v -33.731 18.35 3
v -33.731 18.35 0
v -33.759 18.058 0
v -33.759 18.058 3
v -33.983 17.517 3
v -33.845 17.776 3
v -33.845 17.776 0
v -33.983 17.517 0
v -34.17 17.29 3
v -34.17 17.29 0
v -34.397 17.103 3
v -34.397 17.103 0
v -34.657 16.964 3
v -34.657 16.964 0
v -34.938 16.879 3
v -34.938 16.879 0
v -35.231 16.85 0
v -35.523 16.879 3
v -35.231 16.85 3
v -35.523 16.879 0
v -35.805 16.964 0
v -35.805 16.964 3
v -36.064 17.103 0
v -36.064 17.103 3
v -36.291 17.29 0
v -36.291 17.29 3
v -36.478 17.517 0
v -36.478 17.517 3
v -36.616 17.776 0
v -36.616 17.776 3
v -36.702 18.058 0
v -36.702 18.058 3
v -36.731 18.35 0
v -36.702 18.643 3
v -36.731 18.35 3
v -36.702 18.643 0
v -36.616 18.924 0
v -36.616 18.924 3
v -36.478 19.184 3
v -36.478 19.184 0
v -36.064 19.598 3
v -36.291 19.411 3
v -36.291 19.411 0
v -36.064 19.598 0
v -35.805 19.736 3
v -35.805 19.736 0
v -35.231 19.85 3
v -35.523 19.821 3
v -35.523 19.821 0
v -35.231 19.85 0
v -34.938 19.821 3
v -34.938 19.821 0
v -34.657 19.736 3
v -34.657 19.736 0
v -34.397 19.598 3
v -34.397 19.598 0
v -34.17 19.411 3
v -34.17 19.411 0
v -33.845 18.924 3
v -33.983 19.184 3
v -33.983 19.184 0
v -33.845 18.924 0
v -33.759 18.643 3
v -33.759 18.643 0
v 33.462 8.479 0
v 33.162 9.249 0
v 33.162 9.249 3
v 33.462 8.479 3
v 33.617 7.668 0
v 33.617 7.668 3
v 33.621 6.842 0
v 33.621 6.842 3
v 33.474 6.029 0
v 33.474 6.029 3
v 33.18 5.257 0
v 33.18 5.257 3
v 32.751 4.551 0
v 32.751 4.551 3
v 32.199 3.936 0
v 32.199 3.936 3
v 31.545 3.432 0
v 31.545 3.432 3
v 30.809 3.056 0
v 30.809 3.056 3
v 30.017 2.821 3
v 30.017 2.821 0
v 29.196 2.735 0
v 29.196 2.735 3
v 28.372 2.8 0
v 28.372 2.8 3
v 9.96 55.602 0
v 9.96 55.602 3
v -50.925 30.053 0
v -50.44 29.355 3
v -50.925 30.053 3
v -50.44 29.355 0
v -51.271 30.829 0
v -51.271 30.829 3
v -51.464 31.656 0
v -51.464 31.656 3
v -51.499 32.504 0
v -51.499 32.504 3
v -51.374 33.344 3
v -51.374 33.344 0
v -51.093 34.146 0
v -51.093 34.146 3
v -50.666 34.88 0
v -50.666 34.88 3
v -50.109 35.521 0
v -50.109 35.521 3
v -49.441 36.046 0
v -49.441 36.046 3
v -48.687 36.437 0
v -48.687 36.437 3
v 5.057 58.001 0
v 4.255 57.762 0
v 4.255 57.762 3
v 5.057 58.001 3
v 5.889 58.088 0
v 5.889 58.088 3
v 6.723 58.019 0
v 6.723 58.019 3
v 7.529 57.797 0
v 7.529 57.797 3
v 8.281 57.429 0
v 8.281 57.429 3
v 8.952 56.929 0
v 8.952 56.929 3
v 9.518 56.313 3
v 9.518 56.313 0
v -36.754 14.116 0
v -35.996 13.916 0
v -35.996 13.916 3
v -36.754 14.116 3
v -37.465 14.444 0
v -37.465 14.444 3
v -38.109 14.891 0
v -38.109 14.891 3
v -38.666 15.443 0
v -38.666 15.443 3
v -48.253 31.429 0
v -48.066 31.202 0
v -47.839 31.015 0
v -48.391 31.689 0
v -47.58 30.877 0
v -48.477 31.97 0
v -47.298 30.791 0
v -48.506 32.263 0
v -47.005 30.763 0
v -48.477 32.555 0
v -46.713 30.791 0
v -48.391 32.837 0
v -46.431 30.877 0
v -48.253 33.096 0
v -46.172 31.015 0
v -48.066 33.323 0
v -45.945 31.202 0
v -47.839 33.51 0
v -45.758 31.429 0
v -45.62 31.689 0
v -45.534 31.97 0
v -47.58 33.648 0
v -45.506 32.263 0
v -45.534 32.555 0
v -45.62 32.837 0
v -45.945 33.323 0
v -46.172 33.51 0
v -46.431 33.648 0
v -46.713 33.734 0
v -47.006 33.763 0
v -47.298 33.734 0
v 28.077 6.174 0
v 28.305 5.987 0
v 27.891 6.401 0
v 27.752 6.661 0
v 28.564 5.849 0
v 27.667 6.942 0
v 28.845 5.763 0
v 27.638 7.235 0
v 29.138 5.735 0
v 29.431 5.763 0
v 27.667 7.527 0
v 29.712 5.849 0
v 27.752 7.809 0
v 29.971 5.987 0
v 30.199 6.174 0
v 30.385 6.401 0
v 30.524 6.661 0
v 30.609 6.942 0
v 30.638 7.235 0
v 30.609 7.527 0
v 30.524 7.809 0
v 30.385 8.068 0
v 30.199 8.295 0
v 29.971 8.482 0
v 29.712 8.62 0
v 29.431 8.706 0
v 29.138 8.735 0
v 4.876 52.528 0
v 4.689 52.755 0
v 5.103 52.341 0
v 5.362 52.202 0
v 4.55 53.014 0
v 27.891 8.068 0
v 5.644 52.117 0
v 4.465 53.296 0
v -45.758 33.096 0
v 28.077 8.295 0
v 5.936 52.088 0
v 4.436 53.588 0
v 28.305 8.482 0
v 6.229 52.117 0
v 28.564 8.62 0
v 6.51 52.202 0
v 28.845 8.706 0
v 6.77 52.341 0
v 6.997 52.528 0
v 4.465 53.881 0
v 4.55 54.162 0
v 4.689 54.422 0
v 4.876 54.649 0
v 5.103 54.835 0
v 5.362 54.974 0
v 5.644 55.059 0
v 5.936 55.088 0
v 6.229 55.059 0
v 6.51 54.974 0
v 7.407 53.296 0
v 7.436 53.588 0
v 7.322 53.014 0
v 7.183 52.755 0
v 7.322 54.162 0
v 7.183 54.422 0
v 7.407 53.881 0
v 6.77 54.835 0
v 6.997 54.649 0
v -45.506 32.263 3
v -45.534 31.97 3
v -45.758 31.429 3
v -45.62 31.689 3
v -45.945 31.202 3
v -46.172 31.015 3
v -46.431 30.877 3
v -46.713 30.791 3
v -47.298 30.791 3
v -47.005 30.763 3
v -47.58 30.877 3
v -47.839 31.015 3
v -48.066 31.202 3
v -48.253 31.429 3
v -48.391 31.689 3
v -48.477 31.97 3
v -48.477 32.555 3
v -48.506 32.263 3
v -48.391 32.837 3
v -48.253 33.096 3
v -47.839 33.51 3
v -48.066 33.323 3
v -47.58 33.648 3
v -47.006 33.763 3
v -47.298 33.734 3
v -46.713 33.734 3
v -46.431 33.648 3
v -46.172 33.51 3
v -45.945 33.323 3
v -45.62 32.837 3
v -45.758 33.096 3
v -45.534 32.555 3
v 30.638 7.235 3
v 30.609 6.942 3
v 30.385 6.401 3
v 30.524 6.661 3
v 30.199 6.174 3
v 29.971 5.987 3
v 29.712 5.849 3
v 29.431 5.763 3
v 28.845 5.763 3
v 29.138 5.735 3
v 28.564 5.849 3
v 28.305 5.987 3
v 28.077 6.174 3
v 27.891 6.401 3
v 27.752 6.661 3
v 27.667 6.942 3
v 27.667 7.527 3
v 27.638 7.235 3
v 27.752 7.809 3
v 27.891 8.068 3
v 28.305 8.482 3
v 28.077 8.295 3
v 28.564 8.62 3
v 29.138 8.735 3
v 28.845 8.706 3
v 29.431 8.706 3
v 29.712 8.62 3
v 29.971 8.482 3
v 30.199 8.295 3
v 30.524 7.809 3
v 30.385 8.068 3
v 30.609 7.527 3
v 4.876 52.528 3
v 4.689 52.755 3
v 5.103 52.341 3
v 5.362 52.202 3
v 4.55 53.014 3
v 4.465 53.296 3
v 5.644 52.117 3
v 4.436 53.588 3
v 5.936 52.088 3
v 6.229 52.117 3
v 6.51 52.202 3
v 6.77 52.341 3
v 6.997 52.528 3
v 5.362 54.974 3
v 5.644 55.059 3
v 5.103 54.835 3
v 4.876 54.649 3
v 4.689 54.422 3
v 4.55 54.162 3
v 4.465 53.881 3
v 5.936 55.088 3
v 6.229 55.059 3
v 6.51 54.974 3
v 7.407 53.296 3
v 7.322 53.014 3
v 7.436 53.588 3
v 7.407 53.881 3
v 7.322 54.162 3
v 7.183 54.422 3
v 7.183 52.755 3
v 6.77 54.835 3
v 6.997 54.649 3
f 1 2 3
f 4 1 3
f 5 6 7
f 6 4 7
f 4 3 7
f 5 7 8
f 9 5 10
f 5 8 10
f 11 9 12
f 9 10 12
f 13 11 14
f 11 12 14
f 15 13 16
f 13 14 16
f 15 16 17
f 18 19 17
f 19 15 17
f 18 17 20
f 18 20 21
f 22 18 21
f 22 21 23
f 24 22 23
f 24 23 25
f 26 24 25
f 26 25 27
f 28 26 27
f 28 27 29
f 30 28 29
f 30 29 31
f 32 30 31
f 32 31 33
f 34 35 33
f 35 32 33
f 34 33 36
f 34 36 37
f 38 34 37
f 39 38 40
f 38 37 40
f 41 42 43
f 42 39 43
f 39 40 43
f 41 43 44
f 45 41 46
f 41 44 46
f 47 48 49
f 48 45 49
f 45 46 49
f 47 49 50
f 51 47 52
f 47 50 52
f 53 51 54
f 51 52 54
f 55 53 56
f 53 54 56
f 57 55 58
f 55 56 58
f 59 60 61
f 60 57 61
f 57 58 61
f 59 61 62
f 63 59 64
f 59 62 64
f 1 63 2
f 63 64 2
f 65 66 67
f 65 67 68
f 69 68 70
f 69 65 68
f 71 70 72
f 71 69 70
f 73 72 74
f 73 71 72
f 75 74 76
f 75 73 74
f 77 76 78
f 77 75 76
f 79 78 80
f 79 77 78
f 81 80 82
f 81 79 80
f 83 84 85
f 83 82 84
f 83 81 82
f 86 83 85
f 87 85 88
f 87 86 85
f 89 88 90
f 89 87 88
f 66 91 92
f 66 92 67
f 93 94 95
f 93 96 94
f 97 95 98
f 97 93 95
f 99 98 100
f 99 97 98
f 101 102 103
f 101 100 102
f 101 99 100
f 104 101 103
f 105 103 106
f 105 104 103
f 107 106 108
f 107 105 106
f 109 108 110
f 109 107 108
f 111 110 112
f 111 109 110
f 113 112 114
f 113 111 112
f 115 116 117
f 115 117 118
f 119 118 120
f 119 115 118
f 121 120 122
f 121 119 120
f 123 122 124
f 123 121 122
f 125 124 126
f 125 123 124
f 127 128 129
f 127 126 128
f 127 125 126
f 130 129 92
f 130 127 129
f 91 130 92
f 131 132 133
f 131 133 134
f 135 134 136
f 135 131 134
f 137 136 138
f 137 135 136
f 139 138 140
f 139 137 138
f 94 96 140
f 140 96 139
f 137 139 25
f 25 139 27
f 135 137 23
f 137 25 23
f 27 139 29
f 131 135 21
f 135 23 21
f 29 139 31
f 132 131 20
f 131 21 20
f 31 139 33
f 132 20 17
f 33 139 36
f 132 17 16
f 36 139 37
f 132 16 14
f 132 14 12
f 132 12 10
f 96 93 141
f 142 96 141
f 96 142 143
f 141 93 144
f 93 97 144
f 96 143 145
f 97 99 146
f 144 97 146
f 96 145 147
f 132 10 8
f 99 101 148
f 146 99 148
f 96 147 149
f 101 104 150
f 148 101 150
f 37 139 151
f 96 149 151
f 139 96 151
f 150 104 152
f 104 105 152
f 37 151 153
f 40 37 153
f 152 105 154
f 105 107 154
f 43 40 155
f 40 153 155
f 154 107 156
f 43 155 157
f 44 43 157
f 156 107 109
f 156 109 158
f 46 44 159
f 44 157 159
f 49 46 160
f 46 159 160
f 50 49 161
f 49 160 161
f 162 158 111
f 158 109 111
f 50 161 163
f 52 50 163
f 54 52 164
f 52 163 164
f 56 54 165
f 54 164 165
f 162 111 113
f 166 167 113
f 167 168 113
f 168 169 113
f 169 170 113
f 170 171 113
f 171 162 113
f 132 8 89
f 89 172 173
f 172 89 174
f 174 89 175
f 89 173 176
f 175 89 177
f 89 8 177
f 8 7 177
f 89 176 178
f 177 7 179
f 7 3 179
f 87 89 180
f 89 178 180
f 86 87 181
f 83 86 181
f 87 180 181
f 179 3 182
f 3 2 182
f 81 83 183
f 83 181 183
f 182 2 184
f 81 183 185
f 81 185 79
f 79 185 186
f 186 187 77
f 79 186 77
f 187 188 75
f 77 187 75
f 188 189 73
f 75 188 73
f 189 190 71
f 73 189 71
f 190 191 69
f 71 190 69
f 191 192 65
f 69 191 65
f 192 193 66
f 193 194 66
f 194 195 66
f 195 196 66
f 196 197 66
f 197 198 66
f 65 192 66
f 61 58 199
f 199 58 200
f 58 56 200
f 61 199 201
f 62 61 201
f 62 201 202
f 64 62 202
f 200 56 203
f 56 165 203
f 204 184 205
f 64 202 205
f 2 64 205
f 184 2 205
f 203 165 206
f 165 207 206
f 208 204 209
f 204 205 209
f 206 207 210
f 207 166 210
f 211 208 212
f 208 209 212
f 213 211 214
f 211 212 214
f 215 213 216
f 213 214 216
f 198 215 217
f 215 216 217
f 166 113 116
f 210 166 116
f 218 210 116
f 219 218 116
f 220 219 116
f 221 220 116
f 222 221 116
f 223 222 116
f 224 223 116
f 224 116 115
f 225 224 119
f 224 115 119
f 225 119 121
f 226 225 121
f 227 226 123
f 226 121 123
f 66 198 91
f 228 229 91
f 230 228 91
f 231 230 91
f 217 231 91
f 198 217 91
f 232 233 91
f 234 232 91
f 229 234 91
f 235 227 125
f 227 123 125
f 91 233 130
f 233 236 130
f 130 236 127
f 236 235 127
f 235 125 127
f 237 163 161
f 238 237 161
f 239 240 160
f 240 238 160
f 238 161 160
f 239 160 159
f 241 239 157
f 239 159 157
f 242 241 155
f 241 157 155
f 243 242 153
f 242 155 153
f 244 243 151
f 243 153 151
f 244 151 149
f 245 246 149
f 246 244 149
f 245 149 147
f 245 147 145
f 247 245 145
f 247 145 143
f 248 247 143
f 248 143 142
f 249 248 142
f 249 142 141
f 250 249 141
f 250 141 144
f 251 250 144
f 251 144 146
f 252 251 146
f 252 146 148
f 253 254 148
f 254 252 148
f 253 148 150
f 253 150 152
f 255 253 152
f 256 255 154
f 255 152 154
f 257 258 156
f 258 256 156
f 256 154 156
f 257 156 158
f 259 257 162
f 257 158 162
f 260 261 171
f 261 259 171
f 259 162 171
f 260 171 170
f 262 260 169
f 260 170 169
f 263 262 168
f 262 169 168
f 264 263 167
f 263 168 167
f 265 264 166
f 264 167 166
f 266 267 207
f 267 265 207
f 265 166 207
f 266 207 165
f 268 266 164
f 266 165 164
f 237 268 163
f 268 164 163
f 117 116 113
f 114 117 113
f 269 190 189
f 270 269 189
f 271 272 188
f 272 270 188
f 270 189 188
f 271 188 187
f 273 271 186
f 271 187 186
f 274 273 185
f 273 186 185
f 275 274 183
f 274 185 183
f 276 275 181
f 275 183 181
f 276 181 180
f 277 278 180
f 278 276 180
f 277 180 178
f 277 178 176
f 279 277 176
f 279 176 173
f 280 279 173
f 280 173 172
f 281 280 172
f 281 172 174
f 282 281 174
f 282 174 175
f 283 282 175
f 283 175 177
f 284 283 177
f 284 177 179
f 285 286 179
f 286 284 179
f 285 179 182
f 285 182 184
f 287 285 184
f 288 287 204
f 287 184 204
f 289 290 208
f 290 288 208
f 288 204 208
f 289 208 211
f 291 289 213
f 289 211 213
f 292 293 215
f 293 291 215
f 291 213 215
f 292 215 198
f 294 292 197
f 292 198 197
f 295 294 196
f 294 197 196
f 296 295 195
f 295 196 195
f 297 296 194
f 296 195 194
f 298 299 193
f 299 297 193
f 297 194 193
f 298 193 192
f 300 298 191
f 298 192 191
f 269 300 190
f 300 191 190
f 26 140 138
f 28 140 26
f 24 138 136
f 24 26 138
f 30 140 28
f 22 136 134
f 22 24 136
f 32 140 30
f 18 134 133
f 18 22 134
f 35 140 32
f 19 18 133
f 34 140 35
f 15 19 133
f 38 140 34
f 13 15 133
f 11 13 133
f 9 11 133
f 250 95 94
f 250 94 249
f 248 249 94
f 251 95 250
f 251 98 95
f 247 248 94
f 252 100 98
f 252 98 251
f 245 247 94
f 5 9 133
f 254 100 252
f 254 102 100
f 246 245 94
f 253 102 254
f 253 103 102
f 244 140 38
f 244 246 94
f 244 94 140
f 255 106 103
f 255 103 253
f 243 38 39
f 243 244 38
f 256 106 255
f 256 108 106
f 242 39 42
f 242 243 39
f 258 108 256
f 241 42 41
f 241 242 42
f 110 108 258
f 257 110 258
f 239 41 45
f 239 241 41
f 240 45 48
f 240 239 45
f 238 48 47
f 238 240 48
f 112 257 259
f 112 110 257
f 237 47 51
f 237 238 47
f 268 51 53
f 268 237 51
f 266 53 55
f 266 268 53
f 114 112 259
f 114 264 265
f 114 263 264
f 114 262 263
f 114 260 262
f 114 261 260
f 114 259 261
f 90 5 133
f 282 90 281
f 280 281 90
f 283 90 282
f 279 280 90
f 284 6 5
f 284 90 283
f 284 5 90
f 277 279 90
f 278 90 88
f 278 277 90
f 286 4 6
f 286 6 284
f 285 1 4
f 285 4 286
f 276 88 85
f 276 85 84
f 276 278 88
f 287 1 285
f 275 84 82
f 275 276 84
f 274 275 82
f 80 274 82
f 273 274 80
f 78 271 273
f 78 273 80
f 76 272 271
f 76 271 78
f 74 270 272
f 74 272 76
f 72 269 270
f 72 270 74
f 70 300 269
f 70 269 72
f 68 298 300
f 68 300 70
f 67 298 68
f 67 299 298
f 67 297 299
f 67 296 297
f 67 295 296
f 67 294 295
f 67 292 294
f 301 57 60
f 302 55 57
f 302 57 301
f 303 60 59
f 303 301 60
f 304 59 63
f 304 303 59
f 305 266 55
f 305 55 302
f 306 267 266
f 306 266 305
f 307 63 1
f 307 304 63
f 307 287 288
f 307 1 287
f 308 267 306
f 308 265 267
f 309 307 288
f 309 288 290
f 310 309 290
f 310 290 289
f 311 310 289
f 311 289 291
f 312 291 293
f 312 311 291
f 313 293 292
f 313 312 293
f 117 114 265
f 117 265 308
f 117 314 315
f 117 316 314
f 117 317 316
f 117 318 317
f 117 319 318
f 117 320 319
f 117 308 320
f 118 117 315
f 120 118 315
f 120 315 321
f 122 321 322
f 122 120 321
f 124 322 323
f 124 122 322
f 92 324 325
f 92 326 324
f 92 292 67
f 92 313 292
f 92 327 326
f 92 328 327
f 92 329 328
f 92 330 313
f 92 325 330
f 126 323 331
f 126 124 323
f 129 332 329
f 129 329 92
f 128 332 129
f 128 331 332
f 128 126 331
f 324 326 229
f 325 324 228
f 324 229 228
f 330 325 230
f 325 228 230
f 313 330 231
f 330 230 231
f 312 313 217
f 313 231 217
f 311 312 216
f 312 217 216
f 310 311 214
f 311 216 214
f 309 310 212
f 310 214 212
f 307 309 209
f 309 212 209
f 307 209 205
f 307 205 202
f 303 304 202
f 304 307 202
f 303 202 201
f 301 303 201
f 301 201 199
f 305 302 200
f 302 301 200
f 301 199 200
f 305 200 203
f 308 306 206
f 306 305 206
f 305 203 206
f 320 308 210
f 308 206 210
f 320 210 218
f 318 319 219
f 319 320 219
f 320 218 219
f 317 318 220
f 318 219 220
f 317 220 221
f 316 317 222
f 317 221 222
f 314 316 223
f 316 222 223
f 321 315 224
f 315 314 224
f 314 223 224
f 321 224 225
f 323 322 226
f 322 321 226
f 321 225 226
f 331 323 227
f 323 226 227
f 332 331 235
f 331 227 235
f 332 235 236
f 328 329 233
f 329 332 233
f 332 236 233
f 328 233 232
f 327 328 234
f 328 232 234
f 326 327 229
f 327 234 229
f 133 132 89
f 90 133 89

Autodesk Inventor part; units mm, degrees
ref_plane "YZ Plane" through (0, 0, 0) normal (1, 0, 0) x (0, 1, 0)
ref_plane "XZ Plane" through (0, 0, 0) normal (0, 1, 0) x (-1, 0, 0)
ref_plane "XY Plane" through (0, 0, 0) normal (0, 0, 1) x (1, 0, 0)
sketch "スケッチ2" plane through (0, 0, 0) normal (0, 0, 1) x (1, 0, 0)
  circle A0 centre (0, 0) radius 10.1 construction
  circle A1 centre (25.3202, -9.9362) radius 17.1 construction
  circle A2 centre (110.4743, -16.4118) radius 28.1 construction
  circle A3 centre (62.4131, -12.7569) radius 20.1 construction
  circle A4 centre (-21.6908, -16.4118) radius 17.1 construction
  circle A5 centre (-105.5257, -16.4118) radius 28.1 construction
  line L0 (-170.915, -81.4118) -> (490.0044, -81.4118)
  line L1 (-105.5257, -16.4118) -> (-21.6908, -16.4118) construction
  line L2 (110.4743, -16.4118) -> (25.3202, -9.9362) construction
  line L3 (110.4743, -16.4118) -> (104.1501, -0.632)
  line L4 (104.1501, -0.632) -> (95.5937, 20.7173) construction
  line L5 (95.5937, 20.7173) -> (70.4743, -10.4118) construction
  line L6 (70.4743, -10.4118) -> (110.4743, -16.4118) construction
  line L7 (-137.6819, 53.5882) -> (165.8186, 53.5882)
  line L8 (25.3202, -9.9362) -> (108.6869, 8.5882) construction
  line L9 (25.3202, -9.9362) -> (102.5386, -46.4118) construction
  line L10 (25.3202, -9.9362) -> (5.9362, 53.5882) construction
  line L11 (5.9362, 53.5882) -> (127.6431, 30.2622)
  line L12 (127.6431, 30.2622) -> (110.4743, -16.4118) construction
  line L13 (102.5386, -46.4118) -> (118.0681, 0.8329) construction
  line L14 (118.0681, 0.8329) -> (5.9362, 53.5882) construction
  line L15 (108.6869, 8.5882) -> (129.8583, 53.5882) construction
  line L16 (129.8583, 53.5882) -> (5.9362, 53.5882) construction
  line L17 (119.2726, 31.0882) -> (366.4441, 68.5882) construction
  line L18 (119.0587, 6.9252) -> (362.0213, 65.8249) construction
  line L19 (110.3034, -22.7894) -> (351.0624, 44.5537) construction
  line L20 (127.6431, 30.2622) -> (4.1927, 19.4617) construction
  circle A6 centre (80.4743, 23.124) radius 3 construction
  circle A7 centre (80.4743, 23.124) radius 1.5
  arc A8 (79.801, 27.5733) -> (76.162, 24.4099) centre (80.4743, 23.124) ccw
  circle A9 centre (70.4743, -10.4118) radius 1.5
  arc A10 (66.162, -9.1259) -> (69.4242, -14.7876) centre (70.4743, -10.4118) ccw
  circle A11 centre (150.4743, 0.5882) radius 1.5
  arc A12 (152.5623, -3.3981) -> (154.0408, 3.3323) centre (150.4743, 0.5882) ccw
  circle A13 centre (127.6431, 30.2622) radius 1.5
  arc A14 (131.2816, 32.9102) -> (126.9698, 34.7115) centre (127.6431, 30.2622) ccw
  circle A15 centre (110.4743, -16.4118) radius 5
  arc A16 (108.6075, -24.1909) -> (114.1862, -23.4986) centre (110.4743, -16.4118) ccw
  line L21 (76.162, 24.4099) -> (66.162, -9.1259)
  line L22 (69.4242, -14.7876) -> (108.6075, -24.1909)
  line L23 (114.1862, -23.4986) -> (152.5623, -3.3981)
  line L24 (154.0408, 3.3323) -> (131.2097, 33.0062)
  line L25 (126.9698, 34.7115) -> (79.801, 27.5733)
  circle A17 centre (-145.5257, 0.5882) radius 1.5
  arc A18 (-149.0922, 3.3323) -> (-147.6136, -3.3981) centre (-145.5257, 0.5882) ccw
  circle A19 centre (-105.5257, -16.4118) radius 5
  arc A20 (-109.2375, -23.4986) -> (-103.6588, -24.1909) centre (-105.5257, -16.4118) ccw
  circle A21 centre (-65.5257, -10.4118) radius 1.5
  arc A22 (-64.4756, -14.7876) -> (-61.2133, -9.1259) centre (-65.5257, -10.4118) ccw
  circle A23 centre (0, 0) radius 20.05 construction
  circle A24 centre (110.4743, -16.4118) radius 30.1 construction
  circle A25 centre (62.4131, -12.7569) radius 22.1 construction
  circle A26 centre (25.3202, -9.9362) radius 19.1 construction
  circle A27 centre (0, 0) radius 12.1 construction
  circle A28 centre (-21.6908, -16.4118) radius 19.1 construction
  circle A29 centre (-105.5257, -16.4118) radius 30.1 construction
  circle A30 centre (0, 0) radius 20.55 construction
  circle A31 centre (95.5937, 20.7173) radius 4.025 construction
  circle A32 centre (95.5937, 20.7173) radius 6.025 construction
  circle A33 centre (-75.5257, 23.124) radius 1.5
  arc A34 (-71.2133, 24.4099) -> (-74.8523, 27.5733) centre (-75.5257, 23.124) ccw
  circle A35 centre (-122.6945, 30.2622) radius 1.5
  arc A36 (-122.0212, 34.7115) -> (-126.261, 33.0062) centre (-122.6945, 30.2622) ccw
  line L26 (-126.261, 33.0062) -> (-149.0922, 3.3323)
  line L27 (-147.6136, -3.3981) -> (-109.2375, -23.4986)
  line L28 (-103.6588, -24.1909) -> (-64.4756, -14.7876)
  line L29 (-61.2133, -9.1259) -> (-71.2133, 24.4099)
  line L30 (-74.8523, 27.5733) -> (-122.0212, 34.7115)
  circle A37 centre (14, -17.4118) radius 2.2921 construction
  circle A38 centre (-14, -17.4118) radius 2.2921 construction
  circle A39 centre (-14, -17.4118) radius 14 construction
  circle A40 centre (14, -17.4118) radius 14 construction
  line L31 (-170.6512, -31.4118) -> (202.8656, -31.4118)
  line L32 (5.9362, 53.5882) -> (-38.6574, 35.6253) construction
  line L33 (5.9362, 53.5882) -> (-26.7676, 18.3503) construction
  circle A41 centre (5.9362, 53.5882) radius 1.5
  arc A42 (9.9603, 55.6024) -> (4.2549, 57.7623) centre (5.9362, 53.5882) ccw
  line L34 (-21.6908, -16.4118) -> (-99.9742, 13.5882) construction
  line L35 (-21.6908, -16.4118) -> (-101.7113, -41.4118) construction
  line L36 (9.9603, 55.6024) -> (33.1621, 9.2488)
  circle A43 centre (-47.0055, 32.2626) radius 1.5
  arc A44 (-48.6869, 36.4367) -> (-50.4404, 29.3554) centre (-47.0055, 32.2626) ccw
  line L37 (4.2549, 57.7623) -> (-48.6869, 36.4367)
  line L38 (-50.4404, 29.3554) -> (-38.6655, 15.4431)
  circle A45 centre (29.1381, 7.2346) radius 3 construction
  circle A46 centre (-84.8661, 5.2713) radius 4.5 construction
  circle A47 centre (-132.0174, -1.9813) radius 4.5 construction
  line L39 (-132.7015, 2.4664) -> (-85.5502, 9.719) construction
  arc A48 (28.3723, 2.8003) -> (33.1621, 9.2488) centre (29.1381, 7.2346) ccw
  arc A49 (-38.6655, 15.4431) -> (-35.9964, 13.9159) centre (-35.2306, 18.3503) ccw
  line L40 (-35.9964, 13.9159) -> (28.3723, 2.8003)
  circle A50 centre (-38.6574, 35.6253) radius 3 construction
  circle A51 centre (25.3202, -9.9362) radius 4.025 construction
  circle A52 centre (-21.6908, -16.4118) radius 4.025 construction
  circle A53 centre (-35.2306, 18.3503) radius 1.5
  circle A54 centre (29.1381, 7.2346) radius 1.5
  circle A55 centre (-57.813, 39.7705) radius 4.5 construction
  circle A56 centre (-99.304, 63.3152) radius 4.5 construction
  line L41 (5.9362, 53.5882) -> (-32.8159, 25.1361) construction
  circle A57 centre (-58.0056, -24.4791) radius 20.1 construction
  circle A58 centre (-58.0056, -24.4791) radius 22.1 construction
  line L42 (-53.3261, 39.4281) -> (-56.2797, 0.7243) construction
  circle A59 centre (-38.6574, 35.6253) radius 4.5
  dimension "d207" = 9
  dimension "d208" = 9
  dimension "d223" = 9
  dimension "d119" = 20.2
  dimension "d120" = 34.2
  dimension "d121" = 56.2
  dimension "d122" = 40.2
  dimension "d123" = 216
  dimension "d124" = 65
  dimension "d125" = 65
  dimension "d126" = 34.2
  dimension "d127" = 56.2
  dimension "d128" = 17
  dimension "d129" = 23
  dimension "d130" = 40
  dimension "d131" = 40
  dimension "d132" = 6
  dimension "d133" = 135
  dimension "d134" = 25
  dimension "d135" = 30
  dimension "d136" = 5
  dimension "d137" = 2
  dimension "d138" = 250
  dimension "d139" = 150
  dimension "d140" = 250
  dimension "d141" = 250
  dimension "d142" = 123.823
  dimension "d143" = 123.823
  dimension "d144" = 123.823
  dimension "d145" = 6
  dimension "d146" = 3
  dimension "d147" = 9
  dimension "d148" = 3
  dimension "d149" = 9
  dimension "d150" = 3
  dimension "d151" = 9
  dimension "d152" = 40
  dimension "d153" = 17
  dimension "d154" = 3
  dimension "d155" = 9
  dimension "d156" = 10
  dimension "d157" = 3
  dimension "d158" = 3
  dimension "d159" = 9
  dimension "d160" = 40
  dimension "d161" = 17
  dimension "d162" = 10
  dimension "d163" = 3
  dimension "d164" = 3
  dimension "d165" = 9
  dimension "d166" = 40
  dimension "d167" = 6
  dimension "d168" = 40.1
  dimension "d169" = 2
  dimension "d170" = 2
  dimension "d171" = 2
  dimension "d172" = 2
  dimension "d173" = 2
  dimension "d174" = 2
  dimension "d175" = 0.5
  dimension "d176" = 8.05
  dimension "d177" = 2
  dimension "d178" = 3
  dimension "d179" = 9
  dimension "d180" = 3
  dimension "d181" = 9
  dimension "d182" = 46.674
extrude "押し出し2" add sketch "スケッチ2" along normal blind 3 contours A41 L7 L37 A42 L36 | L7 L36 L11 A41 | A59 | A41 L11 L36 A48 L40 A49 L38 A44 L37 L7
equation "\"d126\" = d120"
equation "\"d127\" = d121"
equation "\"d143\" = d142"
equation "\"d144\" = d142"
properties part number "中間外フレーム" material "ポリカーボネート、クリア"
